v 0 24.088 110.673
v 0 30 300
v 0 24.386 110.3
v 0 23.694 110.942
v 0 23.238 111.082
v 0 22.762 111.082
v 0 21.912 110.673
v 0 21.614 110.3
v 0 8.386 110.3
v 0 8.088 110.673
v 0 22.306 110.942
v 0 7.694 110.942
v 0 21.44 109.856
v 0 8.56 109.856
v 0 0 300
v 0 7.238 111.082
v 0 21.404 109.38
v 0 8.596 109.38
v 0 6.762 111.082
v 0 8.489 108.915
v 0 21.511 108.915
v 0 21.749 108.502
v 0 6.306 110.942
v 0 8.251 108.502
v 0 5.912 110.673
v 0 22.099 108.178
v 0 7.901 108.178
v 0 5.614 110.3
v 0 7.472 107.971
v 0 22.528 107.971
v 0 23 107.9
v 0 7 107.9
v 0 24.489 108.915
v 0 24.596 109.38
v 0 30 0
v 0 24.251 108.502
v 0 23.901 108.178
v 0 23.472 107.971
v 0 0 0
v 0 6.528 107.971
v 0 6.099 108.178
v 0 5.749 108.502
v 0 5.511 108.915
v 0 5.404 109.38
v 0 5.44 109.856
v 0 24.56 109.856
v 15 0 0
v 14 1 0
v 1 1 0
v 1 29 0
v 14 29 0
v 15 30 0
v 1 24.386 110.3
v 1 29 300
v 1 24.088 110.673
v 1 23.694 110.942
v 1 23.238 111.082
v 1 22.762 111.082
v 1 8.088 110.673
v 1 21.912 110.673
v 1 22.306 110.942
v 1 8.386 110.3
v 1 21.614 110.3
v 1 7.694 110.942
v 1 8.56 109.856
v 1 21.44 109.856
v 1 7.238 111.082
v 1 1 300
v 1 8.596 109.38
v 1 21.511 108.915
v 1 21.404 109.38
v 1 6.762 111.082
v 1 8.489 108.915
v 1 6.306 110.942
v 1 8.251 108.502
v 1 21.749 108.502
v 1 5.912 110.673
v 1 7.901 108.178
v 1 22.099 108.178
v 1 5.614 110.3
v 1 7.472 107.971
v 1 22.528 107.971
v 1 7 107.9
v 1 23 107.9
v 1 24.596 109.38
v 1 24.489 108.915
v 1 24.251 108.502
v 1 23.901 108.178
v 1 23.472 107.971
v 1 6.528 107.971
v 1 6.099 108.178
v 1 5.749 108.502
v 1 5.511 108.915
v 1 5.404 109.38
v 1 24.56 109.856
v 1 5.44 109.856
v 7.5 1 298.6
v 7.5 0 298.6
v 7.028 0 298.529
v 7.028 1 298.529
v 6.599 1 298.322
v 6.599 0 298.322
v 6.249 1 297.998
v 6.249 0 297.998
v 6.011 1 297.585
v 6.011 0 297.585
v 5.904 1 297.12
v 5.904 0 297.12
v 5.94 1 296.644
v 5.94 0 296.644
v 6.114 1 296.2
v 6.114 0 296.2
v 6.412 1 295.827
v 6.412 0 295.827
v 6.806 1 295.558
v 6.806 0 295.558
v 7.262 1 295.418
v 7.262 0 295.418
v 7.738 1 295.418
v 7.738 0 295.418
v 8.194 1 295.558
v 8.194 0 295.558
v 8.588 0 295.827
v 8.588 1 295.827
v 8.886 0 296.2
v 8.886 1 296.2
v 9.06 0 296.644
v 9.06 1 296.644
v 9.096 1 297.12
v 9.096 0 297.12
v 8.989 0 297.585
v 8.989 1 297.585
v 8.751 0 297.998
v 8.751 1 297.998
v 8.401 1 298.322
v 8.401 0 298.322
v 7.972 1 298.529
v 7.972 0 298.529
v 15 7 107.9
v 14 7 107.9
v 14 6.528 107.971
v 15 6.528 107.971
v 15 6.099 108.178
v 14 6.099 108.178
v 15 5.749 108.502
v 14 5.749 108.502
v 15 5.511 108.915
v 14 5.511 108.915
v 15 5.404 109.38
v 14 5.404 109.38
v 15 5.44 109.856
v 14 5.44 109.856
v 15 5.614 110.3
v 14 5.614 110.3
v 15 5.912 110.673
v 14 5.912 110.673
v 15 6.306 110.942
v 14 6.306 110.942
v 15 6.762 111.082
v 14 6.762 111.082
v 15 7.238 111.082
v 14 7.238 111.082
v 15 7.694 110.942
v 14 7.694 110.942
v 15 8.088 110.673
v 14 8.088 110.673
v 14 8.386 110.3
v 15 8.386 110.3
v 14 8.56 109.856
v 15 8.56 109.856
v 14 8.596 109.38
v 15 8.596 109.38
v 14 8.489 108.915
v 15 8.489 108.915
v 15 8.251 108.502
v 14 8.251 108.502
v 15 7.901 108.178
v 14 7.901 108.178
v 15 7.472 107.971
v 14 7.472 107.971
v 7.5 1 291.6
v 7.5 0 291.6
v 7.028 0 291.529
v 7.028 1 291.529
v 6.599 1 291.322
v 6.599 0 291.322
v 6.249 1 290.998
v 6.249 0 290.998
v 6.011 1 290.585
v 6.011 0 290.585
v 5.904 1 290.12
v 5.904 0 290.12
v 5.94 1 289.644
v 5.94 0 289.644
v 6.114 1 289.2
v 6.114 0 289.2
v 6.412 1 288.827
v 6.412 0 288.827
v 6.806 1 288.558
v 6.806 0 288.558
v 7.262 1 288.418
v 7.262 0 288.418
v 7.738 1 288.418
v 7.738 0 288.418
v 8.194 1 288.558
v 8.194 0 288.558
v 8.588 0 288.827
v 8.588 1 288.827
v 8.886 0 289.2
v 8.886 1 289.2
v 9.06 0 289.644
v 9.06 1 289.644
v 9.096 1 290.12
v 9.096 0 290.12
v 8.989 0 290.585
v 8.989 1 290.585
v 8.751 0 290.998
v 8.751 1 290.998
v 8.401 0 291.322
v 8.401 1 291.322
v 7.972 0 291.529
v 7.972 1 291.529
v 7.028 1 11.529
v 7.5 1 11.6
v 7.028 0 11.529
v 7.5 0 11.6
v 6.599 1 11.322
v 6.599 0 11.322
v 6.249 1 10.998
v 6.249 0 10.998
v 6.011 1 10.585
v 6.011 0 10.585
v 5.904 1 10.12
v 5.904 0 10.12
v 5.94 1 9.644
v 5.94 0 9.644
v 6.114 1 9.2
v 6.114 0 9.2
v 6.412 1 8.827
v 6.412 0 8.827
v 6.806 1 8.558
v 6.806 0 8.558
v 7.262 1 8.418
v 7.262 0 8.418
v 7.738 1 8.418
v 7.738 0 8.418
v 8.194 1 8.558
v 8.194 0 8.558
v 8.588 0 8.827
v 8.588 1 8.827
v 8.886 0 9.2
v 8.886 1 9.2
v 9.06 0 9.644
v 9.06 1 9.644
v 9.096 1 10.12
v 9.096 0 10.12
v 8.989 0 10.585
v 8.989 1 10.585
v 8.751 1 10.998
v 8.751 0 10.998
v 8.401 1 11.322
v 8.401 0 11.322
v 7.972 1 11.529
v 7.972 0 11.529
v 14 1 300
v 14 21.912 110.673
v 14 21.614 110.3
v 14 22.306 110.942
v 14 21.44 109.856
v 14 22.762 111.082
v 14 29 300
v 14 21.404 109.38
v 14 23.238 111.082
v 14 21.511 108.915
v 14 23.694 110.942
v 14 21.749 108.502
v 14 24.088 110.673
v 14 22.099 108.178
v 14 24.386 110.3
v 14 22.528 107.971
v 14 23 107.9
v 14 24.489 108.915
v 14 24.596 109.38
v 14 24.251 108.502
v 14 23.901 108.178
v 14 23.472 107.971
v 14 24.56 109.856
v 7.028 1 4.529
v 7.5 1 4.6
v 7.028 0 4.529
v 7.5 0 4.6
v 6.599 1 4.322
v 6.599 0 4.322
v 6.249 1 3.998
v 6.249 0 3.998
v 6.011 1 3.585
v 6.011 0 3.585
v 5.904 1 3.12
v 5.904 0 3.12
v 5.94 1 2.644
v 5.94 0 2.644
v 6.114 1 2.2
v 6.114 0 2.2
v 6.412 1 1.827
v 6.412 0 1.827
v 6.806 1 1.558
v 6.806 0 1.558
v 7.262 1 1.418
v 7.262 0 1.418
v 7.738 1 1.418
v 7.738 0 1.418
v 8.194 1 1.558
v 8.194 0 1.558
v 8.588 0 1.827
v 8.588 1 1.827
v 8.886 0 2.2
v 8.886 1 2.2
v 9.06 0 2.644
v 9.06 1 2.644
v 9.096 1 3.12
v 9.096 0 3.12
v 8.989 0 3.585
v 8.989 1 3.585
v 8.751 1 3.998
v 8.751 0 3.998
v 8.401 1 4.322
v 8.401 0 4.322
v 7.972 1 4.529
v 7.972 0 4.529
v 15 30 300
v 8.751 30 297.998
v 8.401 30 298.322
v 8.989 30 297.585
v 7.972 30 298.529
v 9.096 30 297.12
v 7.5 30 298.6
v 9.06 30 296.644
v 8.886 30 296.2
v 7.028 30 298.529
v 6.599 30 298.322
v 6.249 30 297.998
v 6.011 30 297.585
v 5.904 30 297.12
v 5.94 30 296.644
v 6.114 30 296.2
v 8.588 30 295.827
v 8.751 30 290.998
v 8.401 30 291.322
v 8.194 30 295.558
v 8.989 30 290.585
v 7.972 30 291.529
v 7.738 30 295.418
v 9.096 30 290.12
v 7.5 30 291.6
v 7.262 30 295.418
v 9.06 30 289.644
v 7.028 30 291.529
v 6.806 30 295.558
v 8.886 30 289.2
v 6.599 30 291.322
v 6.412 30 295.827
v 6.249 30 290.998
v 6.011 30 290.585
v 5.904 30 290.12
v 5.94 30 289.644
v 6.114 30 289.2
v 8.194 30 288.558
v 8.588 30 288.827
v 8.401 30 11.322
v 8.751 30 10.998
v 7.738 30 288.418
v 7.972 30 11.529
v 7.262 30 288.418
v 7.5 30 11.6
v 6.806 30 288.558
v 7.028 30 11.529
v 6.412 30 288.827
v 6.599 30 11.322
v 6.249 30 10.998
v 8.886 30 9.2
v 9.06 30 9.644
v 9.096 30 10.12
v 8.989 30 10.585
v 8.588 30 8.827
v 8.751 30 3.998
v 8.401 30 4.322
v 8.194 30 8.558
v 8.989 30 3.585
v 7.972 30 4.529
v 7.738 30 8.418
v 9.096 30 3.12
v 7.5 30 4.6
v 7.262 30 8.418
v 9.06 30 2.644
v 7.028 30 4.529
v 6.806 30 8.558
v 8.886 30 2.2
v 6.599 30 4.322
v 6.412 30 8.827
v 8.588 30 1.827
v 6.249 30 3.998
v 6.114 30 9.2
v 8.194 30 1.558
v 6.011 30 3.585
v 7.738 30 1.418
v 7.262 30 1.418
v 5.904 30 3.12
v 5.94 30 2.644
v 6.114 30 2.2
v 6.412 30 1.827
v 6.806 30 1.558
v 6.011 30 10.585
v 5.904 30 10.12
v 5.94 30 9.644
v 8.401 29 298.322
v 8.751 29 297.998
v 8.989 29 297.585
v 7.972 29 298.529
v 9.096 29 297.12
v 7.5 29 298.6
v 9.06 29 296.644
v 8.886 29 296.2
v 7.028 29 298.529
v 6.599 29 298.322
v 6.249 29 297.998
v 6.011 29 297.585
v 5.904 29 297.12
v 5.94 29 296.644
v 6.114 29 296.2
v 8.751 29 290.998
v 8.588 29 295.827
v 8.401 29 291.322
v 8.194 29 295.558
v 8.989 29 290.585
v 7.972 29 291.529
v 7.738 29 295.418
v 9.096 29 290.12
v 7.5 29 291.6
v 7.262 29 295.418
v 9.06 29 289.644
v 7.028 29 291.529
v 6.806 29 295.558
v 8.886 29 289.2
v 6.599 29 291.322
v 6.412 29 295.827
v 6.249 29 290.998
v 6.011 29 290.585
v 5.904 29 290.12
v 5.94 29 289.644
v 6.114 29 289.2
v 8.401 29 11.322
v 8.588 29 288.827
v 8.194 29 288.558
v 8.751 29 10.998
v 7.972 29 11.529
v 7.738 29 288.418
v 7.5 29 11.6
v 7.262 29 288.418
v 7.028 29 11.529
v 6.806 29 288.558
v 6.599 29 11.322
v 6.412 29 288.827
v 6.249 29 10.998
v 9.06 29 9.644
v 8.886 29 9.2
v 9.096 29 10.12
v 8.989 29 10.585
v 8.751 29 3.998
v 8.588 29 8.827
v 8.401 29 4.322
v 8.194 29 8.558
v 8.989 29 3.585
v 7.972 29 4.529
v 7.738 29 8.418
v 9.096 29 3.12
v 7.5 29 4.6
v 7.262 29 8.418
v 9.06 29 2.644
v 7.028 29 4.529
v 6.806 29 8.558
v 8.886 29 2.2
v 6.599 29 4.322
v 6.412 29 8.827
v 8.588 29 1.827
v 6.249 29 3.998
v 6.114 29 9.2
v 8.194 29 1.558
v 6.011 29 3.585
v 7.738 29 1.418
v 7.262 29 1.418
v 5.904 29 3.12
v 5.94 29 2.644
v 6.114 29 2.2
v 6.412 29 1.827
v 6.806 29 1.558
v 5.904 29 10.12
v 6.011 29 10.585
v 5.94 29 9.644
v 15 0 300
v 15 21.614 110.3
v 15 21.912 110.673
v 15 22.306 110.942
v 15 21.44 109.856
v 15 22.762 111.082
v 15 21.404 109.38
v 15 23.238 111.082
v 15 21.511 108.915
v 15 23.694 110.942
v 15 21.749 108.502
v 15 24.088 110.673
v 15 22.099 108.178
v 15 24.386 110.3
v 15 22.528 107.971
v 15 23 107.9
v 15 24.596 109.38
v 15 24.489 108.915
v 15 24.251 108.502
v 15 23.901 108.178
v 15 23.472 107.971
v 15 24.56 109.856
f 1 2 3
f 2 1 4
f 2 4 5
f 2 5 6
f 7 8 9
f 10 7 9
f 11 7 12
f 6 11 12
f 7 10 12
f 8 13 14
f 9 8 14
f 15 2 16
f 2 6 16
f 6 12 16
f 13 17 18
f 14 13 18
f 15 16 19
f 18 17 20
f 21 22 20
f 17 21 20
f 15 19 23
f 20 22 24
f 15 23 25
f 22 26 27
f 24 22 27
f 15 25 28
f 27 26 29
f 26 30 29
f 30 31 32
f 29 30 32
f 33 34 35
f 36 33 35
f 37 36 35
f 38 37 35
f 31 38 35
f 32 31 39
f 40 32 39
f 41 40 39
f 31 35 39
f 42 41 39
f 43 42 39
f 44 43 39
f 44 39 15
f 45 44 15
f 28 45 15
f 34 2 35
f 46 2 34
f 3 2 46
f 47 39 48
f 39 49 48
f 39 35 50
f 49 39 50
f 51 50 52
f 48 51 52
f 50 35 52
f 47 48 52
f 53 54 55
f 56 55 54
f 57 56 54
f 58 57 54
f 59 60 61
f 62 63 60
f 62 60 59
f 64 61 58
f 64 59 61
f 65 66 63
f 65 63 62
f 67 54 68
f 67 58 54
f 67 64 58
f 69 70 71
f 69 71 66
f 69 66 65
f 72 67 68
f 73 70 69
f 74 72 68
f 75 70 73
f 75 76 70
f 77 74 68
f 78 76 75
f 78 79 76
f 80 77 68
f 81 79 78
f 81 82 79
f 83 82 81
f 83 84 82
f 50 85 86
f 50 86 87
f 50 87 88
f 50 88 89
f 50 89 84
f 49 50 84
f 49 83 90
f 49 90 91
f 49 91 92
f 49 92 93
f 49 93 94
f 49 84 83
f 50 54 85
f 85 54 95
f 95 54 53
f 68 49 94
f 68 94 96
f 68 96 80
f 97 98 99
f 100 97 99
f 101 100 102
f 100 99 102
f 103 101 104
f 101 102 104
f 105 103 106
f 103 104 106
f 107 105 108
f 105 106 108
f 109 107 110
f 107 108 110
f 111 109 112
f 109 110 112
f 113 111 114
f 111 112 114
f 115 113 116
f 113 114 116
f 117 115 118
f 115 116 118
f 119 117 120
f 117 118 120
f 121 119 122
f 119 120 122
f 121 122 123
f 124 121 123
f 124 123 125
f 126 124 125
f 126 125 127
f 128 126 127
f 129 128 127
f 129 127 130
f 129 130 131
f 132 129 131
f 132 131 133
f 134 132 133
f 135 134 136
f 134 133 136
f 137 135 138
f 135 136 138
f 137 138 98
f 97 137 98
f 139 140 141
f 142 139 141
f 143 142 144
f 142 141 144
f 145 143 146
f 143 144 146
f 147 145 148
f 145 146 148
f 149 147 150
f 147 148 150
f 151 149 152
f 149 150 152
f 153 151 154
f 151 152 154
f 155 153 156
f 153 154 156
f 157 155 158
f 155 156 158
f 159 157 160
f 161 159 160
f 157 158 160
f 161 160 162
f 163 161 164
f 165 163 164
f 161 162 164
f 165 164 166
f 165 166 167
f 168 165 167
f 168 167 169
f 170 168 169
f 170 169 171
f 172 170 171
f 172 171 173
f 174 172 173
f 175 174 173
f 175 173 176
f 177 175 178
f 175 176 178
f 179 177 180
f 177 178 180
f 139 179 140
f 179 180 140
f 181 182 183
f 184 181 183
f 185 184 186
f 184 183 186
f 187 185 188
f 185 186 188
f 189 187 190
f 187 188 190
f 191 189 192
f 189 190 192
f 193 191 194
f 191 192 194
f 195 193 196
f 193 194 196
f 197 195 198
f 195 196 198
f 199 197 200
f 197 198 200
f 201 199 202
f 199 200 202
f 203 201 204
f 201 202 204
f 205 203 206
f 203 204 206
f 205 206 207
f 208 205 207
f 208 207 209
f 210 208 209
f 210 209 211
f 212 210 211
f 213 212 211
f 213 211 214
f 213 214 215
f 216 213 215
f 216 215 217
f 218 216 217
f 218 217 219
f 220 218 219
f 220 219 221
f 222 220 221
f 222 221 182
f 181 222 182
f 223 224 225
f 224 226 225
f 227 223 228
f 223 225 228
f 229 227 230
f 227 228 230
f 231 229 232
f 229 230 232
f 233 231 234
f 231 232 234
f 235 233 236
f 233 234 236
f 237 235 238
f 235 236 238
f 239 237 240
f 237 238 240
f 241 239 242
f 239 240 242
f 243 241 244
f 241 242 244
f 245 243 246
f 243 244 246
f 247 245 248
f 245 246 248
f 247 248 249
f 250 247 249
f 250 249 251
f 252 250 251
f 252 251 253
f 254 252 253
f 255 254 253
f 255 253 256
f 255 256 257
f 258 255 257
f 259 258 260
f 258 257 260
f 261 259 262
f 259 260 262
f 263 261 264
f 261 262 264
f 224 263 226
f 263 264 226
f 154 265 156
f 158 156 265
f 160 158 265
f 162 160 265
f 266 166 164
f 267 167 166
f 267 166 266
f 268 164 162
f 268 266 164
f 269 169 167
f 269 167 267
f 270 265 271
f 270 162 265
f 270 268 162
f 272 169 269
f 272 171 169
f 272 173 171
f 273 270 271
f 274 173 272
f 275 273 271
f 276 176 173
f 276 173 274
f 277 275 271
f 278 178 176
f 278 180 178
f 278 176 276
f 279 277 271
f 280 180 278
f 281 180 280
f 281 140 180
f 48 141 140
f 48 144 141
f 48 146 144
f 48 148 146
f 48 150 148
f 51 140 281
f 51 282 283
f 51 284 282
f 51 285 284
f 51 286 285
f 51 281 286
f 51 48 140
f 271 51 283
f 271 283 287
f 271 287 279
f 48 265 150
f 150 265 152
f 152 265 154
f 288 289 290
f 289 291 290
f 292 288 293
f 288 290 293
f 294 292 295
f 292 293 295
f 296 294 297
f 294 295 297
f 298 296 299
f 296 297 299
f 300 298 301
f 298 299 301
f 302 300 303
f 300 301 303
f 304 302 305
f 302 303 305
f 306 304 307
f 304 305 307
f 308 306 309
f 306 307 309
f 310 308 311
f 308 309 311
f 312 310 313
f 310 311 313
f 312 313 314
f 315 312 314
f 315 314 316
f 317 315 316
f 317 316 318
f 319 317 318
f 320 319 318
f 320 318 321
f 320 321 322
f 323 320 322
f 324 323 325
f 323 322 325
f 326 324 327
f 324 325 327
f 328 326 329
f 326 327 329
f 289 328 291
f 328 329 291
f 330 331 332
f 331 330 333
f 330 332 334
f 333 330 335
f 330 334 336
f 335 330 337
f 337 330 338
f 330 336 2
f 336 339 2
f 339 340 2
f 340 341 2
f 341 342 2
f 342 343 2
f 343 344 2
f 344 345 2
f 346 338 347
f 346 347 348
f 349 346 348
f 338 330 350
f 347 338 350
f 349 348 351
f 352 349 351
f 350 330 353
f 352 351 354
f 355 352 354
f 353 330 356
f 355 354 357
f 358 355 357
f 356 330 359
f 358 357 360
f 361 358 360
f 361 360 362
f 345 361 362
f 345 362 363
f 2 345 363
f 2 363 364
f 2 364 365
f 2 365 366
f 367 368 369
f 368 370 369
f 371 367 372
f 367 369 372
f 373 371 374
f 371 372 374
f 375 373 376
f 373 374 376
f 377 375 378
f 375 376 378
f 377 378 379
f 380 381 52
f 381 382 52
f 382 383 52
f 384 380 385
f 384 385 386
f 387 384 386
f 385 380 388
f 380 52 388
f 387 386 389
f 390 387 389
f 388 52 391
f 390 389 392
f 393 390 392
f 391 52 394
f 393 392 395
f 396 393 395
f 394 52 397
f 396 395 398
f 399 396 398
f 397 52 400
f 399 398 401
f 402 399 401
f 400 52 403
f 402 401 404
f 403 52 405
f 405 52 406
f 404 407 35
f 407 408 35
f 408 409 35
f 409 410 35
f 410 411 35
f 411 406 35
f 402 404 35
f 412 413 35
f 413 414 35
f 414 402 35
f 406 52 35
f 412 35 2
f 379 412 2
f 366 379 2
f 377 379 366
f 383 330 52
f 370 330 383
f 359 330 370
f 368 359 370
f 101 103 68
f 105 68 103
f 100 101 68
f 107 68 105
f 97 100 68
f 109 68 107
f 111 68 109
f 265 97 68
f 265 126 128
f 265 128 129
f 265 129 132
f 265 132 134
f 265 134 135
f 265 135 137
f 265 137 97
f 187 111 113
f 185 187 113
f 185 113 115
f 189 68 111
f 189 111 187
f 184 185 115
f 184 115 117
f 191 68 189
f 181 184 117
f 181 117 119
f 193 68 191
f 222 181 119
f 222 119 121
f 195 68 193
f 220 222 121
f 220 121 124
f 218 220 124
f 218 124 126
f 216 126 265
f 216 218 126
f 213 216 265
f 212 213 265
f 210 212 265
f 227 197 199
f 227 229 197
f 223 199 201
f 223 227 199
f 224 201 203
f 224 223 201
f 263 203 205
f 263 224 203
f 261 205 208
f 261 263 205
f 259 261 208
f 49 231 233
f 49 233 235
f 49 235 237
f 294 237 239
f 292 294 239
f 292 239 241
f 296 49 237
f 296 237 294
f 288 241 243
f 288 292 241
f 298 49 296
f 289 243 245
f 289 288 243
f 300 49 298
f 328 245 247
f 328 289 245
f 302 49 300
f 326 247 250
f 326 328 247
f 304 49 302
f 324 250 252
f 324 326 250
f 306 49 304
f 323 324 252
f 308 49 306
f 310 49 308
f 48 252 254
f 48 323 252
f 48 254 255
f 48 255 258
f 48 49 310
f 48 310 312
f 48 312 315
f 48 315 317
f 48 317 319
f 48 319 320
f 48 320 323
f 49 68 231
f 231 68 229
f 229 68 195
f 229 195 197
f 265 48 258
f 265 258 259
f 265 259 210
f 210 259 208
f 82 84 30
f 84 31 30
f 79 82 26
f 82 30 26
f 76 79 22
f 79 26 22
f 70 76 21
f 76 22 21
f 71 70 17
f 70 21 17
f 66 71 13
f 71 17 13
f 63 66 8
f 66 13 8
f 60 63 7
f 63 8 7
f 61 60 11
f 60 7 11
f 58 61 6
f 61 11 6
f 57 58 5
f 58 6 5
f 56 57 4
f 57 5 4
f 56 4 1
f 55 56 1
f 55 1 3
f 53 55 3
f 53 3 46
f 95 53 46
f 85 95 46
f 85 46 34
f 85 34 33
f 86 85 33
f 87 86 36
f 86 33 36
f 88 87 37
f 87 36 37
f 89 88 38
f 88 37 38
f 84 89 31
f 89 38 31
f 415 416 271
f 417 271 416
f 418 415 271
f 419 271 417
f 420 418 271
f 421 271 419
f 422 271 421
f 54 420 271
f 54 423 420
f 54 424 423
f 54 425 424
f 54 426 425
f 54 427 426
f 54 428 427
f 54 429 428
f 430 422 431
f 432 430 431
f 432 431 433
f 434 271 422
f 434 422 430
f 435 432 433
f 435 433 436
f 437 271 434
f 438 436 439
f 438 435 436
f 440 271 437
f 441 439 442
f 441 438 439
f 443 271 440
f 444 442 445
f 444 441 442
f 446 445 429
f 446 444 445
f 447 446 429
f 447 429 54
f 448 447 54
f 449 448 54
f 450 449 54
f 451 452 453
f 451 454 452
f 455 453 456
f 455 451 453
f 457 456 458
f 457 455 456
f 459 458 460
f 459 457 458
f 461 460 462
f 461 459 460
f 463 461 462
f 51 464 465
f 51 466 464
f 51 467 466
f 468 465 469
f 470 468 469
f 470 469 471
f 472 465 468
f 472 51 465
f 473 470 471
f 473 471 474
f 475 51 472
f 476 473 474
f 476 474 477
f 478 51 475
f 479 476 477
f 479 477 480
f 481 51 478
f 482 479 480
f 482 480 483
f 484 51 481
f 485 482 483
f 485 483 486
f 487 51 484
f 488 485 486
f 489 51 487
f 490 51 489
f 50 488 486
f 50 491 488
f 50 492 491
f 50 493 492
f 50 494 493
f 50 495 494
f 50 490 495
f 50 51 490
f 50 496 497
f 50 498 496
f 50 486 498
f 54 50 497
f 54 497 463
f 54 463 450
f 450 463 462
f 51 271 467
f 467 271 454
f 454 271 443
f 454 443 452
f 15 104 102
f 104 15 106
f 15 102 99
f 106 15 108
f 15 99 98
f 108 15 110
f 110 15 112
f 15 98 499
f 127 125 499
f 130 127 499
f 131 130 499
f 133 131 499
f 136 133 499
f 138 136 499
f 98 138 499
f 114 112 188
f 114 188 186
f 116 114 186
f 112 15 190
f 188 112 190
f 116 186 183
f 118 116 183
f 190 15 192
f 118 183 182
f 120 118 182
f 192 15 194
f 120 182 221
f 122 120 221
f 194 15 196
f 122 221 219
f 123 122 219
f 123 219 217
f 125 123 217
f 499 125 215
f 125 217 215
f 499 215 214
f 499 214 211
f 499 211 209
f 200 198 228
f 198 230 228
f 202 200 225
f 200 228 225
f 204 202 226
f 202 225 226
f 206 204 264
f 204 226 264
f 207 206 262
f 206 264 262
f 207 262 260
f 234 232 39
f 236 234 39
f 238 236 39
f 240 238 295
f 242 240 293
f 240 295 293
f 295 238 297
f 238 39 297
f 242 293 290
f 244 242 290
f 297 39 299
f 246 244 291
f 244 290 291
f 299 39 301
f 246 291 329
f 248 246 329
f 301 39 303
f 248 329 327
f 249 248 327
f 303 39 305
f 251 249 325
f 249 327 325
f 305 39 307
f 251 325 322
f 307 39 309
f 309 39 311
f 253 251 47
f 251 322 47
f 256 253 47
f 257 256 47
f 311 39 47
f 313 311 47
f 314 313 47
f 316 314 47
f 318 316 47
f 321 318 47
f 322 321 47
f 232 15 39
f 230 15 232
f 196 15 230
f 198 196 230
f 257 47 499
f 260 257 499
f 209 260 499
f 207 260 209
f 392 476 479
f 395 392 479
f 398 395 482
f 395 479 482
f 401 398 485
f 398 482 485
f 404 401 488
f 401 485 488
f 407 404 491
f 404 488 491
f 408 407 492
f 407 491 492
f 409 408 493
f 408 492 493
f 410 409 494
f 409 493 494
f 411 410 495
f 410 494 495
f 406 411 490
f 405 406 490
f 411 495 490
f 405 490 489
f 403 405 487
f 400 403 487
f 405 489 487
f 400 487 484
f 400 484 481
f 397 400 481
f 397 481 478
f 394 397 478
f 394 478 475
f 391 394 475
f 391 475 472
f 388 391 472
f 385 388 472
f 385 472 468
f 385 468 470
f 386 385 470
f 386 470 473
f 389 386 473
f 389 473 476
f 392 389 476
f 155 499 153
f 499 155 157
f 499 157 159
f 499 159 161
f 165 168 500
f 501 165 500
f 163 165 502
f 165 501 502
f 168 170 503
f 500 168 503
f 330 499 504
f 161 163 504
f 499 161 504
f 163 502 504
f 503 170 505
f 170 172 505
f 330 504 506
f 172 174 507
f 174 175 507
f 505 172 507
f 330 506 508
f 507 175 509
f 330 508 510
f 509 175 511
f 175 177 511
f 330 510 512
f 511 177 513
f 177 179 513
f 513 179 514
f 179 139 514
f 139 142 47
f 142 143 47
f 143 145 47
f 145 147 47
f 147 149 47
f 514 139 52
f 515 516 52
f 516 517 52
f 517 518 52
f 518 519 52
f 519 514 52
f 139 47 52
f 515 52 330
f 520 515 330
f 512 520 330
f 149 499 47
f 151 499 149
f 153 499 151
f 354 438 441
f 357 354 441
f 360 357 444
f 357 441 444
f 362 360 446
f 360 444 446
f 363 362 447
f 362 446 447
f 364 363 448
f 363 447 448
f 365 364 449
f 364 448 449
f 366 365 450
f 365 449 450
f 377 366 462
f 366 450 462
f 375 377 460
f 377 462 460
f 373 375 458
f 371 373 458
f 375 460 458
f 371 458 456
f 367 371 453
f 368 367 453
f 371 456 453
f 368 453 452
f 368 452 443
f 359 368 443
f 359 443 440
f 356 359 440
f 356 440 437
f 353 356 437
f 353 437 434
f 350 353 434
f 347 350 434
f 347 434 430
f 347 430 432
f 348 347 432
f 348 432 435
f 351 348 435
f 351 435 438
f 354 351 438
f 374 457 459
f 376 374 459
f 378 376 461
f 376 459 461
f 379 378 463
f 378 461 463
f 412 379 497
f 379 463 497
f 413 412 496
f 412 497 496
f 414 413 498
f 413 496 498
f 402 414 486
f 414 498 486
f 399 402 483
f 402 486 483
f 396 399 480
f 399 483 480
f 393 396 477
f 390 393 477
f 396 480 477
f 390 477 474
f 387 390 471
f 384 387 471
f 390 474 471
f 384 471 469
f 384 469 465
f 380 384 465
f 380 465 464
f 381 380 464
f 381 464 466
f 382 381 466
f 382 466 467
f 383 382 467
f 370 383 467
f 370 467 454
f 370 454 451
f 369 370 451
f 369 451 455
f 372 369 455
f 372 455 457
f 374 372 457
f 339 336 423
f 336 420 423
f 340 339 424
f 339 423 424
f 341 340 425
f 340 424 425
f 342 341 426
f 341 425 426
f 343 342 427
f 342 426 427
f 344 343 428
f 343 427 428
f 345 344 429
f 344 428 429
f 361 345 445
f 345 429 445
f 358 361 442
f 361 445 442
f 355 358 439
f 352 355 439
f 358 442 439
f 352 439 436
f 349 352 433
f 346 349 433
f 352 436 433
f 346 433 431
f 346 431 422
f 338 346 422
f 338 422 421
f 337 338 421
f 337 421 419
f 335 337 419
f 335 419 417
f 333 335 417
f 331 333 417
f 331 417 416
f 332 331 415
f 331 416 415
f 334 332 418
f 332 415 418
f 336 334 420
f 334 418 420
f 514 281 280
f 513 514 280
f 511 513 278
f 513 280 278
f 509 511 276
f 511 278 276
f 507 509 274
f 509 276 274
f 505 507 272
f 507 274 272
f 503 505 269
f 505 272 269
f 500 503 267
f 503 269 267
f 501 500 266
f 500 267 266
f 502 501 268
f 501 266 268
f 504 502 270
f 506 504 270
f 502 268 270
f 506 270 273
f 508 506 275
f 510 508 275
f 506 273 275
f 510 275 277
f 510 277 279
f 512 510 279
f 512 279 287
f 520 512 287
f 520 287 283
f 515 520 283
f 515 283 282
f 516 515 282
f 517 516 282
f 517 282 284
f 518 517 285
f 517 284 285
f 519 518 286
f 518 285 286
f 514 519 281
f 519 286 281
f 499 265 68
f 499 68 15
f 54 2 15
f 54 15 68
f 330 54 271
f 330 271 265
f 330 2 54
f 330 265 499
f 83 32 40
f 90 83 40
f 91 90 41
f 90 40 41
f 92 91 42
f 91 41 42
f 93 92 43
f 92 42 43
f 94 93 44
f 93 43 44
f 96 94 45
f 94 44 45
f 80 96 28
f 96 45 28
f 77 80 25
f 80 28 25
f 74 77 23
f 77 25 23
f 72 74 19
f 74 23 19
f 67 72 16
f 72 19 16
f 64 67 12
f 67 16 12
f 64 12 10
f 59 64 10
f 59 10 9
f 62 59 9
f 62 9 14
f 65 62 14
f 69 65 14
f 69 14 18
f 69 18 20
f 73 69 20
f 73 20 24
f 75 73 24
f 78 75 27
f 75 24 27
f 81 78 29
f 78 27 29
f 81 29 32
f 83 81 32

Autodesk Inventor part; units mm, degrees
ref_plane "YZ Plane" through (0, 0, 0) normal (1, 0, 0) x (0, 1, 0)
ref_plane "XZ Plane" through (0, 0, 0) normal (0, 1, 0) x (-1, 0, 0)
ref_plane "XY Plane" through (0, 0, 0) normal (0, 0, 1) x (1, 0, 0)
sketch "スケッチ1" plane through (0, 0, 0) normal (0, 0, 1) x (1, 0, 0)
  line L0 (0, 0) -> (15, 0)
  line L1 (15, 0) -> (15, 30)
  line L2 (15, 30) -> (0, 30)
  line L3 (0, 30) -> (0, 0)
  line L4 (1, 1) -> (14, 1)
  line L5 (14, 1) -> (14, 29)
  line L6 (14, 29) -> (1, 29)
  line L7 (1, 29) -> (1, 1)
  dimension "d0" = 15
  dimension "d1" = 30
  dimension "d2" = 13
  dimension "d3" = 28
  dimension "d4" = 1
  dimension "d5" = 1
extrude "押し出し1" add sketch "スケッチ1" along normal blind 300
sketch "スケッチ2" plane through (0, 30, 0) normal (0, 1, 0) x (1, 0, 0)
  circle A0 centre (7.5, -3) radius 1.6
  line L0 (15, 0) -> (15, -300) projected
  line L1 (15, 0) -> (0, 0) projected
  circle A1 centre (7.5, -10) radius 1.6
  line L2 (0, -150) -> (15, -150) construction
  line L3 (15, -300) -> (0, -300) projected
  circle A2 centre (7.5, -297) radius 1.6
  circle A3 centre (7.5, -290) radius 1.6
  dimension "d8" = 3.2
  dimension "d9" = 7.5
  dimension "d10" = 3
  dimension "d11" = 3.2
  dimension "d12" = 7
  dimension "d13" = 7.5
  dimension "d14" = 150
hole "穴1" at (7.5, 30, 297) at (7.5, 30, 290) at (7.5, 30, 10) at (7.5, 30, 3) direction (0, -1, 0) diameter 3.2 depth 30
sketch "スケッチ3" plane through (15, 0, 0) normal (1, 0, 0) x (0, 0, -1)
  circle A0 centre (-109.5, 23) radius 1.6
  line L0 (0, 0) -> (0, 30) projected
  line L1 (0, 30) -> (-300, 30) projected
  circle A1 centre (-109.5, 7) radius 1.6
  line L2 (0, 0) -> (-300, 0) projected
  dimension "d22" = 3.2
  dimension "d23" = 109.5
  dimension "d24" = 7
  dimension "d25" = 3.2
  dimension "d26" = 16
  dimension "d27" = 7
hole "穴2" at (15, 23, 109.5) at (15, 7, 109.5) direction (-1, 0, 0) diameter 3.2 depth 15
equation "\"BendRadius\" = Thickness"
equation "\"BendReliefWidth\" = Thickness"
equation "\"BendReliefDepth\" = 0.5 * Thickness"
equation "\"CornerReliefSize\" = 4 * Thickness"
equation "\"MinimumRemnant\" = 2 * Thickness"
equation "\"TransitionRadius\" = BendRadius"
equation "\"JacobiRadiusSize\" = BendRadius"
equation "\"GapSize\" = Thickness"
equation "\"Thickness\" = 0.5"
properties part number "nhk48"
